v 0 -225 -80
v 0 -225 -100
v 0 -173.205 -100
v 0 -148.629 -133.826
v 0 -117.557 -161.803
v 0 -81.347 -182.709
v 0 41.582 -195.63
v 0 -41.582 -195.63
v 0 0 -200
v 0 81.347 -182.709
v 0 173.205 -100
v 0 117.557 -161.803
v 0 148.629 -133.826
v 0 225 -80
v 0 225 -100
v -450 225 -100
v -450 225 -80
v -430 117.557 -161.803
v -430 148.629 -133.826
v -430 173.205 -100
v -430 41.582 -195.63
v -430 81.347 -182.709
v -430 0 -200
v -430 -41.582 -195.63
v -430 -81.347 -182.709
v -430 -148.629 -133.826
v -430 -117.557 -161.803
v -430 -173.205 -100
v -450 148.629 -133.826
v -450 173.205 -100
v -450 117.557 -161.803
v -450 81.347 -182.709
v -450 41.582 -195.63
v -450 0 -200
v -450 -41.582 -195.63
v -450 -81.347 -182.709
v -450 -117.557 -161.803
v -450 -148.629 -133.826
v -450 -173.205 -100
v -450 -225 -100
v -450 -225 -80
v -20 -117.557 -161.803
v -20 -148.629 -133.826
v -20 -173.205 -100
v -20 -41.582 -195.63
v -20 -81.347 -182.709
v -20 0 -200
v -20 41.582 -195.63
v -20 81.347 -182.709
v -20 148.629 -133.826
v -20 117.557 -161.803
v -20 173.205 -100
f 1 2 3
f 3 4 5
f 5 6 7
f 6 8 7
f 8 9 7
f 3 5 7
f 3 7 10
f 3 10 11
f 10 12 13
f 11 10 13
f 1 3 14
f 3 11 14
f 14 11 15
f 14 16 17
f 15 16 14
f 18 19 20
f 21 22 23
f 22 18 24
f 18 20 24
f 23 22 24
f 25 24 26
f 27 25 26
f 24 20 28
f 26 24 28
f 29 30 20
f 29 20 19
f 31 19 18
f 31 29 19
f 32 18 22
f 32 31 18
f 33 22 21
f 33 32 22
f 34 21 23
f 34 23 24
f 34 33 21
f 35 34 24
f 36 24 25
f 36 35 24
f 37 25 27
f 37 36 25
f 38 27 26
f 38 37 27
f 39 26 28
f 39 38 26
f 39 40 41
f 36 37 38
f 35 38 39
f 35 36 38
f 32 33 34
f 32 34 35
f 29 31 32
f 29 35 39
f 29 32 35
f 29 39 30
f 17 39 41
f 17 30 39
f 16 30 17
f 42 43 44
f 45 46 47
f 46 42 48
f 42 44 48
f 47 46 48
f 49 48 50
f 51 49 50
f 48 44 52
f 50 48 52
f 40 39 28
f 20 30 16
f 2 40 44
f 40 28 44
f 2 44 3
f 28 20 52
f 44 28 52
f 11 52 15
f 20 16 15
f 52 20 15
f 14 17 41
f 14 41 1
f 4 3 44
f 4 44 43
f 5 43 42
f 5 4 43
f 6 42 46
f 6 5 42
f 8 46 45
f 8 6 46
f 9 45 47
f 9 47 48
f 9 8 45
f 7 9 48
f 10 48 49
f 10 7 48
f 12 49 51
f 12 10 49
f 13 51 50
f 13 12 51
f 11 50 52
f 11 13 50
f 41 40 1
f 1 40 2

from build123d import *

# Parameters (mm, degrees)
F1_DEPTH = 20
F2_W     = 450
F2_H     = 450
F3_DEPTH = 20
F5_DEPTH = 20


with BuildPart() as f1:
    # F0 (on Right) → F1 (new body)
    with BuildSketch(Plane.YZ):
        with BuildLine():
            Line((173.2050807569, -100), (-173.2050807569, -100))
            ThreePointArc((-173.2050807569, -100), (0, -200), (173.2050807569, -100))
        make_face()
    extrude(amount=-F1_DEPTH)

    # F2 (on face) → F3 (join)
    with BuildSketch(Plane.XY.offset(-100)):
        with Locations((-225, 0)):
            Rectangle(F2_W, F2_H)
        Polygon((0, 225), (-450, 225), (-450, -225), (0, -225), (0, -173.2050807569), (-20, -173.2050807569), (-20, 173.2050807569), (0, 173.2050807569), align=None)
    extrude(amount=F3_DEPTH)

    # F4 (on face) → F5 (join)
    with BuildSketch(Plane(origin=(-450, 0, 0), x_dir=(0, -1, 0), z_dir=(-1, 0, 0))):
        with BuildLine():
            Line((173.2050807569, -100), (-173.2050807569, -100))
            ThreePointArc((-173.2050807569, -100), (0, -200), (173.2050807569, -100))
        make_face()
    extrude(amount=-F5_DEPTH)


solid = f1.part
